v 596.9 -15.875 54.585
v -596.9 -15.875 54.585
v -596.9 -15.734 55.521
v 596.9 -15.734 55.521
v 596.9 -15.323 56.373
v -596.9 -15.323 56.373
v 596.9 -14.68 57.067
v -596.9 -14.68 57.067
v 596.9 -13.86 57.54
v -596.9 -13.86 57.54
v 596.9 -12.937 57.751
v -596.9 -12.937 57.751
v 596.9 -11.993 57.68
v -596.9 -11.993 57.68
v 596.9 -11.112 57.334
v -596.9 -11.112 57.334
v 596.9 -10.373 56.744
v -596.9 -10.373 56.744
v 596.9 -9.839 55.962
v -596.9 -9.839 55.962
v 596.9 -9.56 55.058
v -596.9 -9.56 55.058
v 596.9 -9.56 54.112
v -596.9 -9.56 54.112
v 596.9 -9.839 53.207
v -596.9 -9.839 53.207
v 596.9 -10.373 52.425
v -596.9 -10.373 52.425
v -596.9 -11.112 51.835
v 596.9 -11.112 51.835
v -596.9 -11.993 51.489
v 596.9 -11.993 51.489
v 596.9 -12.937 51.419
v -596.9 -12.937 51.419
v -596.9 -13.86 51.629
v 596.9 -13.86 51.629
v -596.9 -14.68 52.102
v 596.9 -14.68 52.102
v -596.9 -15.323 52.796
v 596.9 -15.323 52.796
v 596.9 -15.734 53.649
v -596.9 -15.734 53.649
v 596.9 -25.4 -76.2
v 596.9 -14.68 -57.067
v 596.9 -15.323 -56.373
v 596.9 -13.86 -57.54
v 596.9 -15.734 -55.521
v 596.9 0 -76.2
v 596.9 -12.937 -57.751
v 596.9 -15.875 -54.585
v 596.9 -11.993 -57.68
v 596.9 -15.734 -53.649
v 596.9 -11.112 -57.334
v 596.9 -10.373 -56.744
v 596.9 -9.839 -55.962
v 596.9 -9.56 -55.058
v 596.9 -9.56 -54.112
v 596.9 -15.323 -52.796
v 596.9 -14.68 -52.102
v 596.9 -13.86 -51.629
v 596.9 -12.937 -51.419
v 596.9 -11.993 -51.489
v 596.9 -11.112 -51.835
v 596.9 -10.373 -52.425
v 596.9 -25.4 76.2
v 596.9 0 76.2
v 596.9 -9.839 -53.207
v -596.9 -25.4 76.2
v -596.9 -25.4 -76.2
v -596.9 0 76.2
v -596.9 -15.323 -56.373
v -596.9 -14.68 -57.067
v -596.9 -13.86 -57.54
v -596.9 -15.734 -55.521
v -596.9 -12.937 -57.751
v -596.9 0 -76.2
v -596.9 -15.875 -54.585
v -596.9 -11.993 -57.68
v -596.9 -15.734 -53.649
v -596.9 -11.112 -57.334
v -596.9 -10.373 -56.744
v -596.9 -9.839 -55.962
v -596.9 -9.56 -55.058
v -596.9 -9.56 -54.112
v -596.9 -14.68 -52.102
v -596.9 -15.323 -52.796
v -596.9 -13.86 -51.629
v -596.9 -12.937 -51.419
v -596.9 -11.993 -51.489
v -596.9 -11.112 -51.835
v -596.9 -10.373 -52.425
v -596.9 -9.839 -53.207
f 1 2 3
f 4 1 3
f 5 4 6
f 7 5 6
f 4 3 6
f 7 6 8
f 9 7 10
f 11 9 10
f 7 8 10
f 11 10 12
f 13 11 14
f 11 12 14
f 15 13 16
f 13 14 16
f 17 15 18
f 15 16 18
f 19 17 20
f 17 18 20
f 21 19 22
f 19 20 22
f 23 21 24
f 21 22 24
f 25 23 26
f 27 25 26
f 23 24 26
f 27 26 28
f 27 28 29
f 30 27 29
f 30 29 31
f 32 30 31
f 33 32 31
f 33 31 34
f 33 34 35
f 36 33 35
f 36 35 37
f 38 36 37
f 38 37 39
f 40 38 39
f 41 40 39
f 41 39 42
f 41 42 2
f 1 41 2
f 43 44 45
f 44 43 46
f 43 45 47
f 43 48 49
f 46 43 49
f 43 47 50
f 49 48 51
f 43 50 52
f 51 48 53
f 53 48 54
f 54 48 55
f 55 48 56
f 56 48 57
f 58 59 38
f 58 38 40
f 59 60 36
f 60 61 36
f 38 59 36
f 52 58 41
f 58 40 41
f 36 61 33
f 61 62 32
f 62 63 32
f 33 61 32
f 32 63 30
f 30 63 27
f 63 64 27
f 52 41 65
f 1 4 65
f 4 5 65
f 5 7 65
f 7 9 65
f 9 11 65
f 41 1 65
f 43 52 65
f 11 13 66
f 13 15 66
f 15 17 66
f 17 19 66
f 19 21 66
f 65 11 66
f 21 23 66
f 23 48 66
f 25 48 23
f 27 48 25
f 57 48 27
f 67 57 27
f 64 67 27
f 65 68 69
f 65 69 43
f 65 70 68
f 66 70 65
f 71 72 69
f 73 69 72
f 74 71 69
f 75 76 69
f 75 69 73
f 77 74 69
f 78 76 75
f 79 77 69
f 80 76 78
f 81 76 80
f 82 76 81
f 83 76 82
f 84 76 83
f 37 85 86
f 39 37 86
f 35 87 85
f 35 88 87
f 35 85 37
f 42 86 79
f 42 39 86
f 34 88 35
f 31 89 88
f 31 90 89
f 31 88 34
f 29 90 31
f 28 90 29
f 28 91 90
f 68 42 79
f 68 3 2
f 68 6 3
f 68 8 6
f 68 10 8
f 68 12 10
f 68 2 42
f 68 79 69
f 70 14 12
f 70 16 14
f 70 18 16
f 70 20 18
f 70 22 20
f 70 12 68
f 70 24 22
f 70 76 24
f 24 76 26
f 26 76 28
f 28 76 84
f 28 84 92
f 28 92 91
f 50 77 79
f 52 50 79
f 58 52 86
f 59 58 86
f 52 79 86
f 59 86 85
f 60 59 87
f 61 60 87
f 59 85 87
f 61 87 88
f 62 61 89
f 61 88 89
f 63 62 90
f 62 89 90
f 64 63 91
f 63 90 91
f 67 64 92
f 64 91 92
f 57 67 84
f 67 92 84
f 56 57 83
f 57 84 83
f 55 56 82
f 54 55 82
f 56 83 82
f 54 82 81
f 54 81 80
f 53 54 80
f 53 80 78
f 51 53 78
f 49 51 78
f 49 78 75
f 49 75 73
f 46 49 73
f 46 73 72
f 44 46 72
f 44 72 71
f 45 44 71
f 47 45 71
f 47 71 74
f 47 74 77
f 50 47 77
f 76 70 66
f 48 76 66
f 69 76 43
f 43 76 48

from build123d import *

# Parameters (mm, degrees)
F0_W     = 1193.8
F0_H     = 152.4
F1_DEPTH = 25.4
F3_D     = 6.35


with BuildPart() as f1:
    # F0 (on Front) → F1 (new body)
    with BuildSketch(Plane.XZ):
        Rectangle(F0_W, F0_H)
    extrude(amount=F1_DEPTH)

    # F3 (through all)
    with Locations(Plane.YZ.offset(596.9)):
        with Locations((-12.7, 54.584738), (-12.7, -54.584738)):
            Hole(F3_D / 2)


solid = f1.part
